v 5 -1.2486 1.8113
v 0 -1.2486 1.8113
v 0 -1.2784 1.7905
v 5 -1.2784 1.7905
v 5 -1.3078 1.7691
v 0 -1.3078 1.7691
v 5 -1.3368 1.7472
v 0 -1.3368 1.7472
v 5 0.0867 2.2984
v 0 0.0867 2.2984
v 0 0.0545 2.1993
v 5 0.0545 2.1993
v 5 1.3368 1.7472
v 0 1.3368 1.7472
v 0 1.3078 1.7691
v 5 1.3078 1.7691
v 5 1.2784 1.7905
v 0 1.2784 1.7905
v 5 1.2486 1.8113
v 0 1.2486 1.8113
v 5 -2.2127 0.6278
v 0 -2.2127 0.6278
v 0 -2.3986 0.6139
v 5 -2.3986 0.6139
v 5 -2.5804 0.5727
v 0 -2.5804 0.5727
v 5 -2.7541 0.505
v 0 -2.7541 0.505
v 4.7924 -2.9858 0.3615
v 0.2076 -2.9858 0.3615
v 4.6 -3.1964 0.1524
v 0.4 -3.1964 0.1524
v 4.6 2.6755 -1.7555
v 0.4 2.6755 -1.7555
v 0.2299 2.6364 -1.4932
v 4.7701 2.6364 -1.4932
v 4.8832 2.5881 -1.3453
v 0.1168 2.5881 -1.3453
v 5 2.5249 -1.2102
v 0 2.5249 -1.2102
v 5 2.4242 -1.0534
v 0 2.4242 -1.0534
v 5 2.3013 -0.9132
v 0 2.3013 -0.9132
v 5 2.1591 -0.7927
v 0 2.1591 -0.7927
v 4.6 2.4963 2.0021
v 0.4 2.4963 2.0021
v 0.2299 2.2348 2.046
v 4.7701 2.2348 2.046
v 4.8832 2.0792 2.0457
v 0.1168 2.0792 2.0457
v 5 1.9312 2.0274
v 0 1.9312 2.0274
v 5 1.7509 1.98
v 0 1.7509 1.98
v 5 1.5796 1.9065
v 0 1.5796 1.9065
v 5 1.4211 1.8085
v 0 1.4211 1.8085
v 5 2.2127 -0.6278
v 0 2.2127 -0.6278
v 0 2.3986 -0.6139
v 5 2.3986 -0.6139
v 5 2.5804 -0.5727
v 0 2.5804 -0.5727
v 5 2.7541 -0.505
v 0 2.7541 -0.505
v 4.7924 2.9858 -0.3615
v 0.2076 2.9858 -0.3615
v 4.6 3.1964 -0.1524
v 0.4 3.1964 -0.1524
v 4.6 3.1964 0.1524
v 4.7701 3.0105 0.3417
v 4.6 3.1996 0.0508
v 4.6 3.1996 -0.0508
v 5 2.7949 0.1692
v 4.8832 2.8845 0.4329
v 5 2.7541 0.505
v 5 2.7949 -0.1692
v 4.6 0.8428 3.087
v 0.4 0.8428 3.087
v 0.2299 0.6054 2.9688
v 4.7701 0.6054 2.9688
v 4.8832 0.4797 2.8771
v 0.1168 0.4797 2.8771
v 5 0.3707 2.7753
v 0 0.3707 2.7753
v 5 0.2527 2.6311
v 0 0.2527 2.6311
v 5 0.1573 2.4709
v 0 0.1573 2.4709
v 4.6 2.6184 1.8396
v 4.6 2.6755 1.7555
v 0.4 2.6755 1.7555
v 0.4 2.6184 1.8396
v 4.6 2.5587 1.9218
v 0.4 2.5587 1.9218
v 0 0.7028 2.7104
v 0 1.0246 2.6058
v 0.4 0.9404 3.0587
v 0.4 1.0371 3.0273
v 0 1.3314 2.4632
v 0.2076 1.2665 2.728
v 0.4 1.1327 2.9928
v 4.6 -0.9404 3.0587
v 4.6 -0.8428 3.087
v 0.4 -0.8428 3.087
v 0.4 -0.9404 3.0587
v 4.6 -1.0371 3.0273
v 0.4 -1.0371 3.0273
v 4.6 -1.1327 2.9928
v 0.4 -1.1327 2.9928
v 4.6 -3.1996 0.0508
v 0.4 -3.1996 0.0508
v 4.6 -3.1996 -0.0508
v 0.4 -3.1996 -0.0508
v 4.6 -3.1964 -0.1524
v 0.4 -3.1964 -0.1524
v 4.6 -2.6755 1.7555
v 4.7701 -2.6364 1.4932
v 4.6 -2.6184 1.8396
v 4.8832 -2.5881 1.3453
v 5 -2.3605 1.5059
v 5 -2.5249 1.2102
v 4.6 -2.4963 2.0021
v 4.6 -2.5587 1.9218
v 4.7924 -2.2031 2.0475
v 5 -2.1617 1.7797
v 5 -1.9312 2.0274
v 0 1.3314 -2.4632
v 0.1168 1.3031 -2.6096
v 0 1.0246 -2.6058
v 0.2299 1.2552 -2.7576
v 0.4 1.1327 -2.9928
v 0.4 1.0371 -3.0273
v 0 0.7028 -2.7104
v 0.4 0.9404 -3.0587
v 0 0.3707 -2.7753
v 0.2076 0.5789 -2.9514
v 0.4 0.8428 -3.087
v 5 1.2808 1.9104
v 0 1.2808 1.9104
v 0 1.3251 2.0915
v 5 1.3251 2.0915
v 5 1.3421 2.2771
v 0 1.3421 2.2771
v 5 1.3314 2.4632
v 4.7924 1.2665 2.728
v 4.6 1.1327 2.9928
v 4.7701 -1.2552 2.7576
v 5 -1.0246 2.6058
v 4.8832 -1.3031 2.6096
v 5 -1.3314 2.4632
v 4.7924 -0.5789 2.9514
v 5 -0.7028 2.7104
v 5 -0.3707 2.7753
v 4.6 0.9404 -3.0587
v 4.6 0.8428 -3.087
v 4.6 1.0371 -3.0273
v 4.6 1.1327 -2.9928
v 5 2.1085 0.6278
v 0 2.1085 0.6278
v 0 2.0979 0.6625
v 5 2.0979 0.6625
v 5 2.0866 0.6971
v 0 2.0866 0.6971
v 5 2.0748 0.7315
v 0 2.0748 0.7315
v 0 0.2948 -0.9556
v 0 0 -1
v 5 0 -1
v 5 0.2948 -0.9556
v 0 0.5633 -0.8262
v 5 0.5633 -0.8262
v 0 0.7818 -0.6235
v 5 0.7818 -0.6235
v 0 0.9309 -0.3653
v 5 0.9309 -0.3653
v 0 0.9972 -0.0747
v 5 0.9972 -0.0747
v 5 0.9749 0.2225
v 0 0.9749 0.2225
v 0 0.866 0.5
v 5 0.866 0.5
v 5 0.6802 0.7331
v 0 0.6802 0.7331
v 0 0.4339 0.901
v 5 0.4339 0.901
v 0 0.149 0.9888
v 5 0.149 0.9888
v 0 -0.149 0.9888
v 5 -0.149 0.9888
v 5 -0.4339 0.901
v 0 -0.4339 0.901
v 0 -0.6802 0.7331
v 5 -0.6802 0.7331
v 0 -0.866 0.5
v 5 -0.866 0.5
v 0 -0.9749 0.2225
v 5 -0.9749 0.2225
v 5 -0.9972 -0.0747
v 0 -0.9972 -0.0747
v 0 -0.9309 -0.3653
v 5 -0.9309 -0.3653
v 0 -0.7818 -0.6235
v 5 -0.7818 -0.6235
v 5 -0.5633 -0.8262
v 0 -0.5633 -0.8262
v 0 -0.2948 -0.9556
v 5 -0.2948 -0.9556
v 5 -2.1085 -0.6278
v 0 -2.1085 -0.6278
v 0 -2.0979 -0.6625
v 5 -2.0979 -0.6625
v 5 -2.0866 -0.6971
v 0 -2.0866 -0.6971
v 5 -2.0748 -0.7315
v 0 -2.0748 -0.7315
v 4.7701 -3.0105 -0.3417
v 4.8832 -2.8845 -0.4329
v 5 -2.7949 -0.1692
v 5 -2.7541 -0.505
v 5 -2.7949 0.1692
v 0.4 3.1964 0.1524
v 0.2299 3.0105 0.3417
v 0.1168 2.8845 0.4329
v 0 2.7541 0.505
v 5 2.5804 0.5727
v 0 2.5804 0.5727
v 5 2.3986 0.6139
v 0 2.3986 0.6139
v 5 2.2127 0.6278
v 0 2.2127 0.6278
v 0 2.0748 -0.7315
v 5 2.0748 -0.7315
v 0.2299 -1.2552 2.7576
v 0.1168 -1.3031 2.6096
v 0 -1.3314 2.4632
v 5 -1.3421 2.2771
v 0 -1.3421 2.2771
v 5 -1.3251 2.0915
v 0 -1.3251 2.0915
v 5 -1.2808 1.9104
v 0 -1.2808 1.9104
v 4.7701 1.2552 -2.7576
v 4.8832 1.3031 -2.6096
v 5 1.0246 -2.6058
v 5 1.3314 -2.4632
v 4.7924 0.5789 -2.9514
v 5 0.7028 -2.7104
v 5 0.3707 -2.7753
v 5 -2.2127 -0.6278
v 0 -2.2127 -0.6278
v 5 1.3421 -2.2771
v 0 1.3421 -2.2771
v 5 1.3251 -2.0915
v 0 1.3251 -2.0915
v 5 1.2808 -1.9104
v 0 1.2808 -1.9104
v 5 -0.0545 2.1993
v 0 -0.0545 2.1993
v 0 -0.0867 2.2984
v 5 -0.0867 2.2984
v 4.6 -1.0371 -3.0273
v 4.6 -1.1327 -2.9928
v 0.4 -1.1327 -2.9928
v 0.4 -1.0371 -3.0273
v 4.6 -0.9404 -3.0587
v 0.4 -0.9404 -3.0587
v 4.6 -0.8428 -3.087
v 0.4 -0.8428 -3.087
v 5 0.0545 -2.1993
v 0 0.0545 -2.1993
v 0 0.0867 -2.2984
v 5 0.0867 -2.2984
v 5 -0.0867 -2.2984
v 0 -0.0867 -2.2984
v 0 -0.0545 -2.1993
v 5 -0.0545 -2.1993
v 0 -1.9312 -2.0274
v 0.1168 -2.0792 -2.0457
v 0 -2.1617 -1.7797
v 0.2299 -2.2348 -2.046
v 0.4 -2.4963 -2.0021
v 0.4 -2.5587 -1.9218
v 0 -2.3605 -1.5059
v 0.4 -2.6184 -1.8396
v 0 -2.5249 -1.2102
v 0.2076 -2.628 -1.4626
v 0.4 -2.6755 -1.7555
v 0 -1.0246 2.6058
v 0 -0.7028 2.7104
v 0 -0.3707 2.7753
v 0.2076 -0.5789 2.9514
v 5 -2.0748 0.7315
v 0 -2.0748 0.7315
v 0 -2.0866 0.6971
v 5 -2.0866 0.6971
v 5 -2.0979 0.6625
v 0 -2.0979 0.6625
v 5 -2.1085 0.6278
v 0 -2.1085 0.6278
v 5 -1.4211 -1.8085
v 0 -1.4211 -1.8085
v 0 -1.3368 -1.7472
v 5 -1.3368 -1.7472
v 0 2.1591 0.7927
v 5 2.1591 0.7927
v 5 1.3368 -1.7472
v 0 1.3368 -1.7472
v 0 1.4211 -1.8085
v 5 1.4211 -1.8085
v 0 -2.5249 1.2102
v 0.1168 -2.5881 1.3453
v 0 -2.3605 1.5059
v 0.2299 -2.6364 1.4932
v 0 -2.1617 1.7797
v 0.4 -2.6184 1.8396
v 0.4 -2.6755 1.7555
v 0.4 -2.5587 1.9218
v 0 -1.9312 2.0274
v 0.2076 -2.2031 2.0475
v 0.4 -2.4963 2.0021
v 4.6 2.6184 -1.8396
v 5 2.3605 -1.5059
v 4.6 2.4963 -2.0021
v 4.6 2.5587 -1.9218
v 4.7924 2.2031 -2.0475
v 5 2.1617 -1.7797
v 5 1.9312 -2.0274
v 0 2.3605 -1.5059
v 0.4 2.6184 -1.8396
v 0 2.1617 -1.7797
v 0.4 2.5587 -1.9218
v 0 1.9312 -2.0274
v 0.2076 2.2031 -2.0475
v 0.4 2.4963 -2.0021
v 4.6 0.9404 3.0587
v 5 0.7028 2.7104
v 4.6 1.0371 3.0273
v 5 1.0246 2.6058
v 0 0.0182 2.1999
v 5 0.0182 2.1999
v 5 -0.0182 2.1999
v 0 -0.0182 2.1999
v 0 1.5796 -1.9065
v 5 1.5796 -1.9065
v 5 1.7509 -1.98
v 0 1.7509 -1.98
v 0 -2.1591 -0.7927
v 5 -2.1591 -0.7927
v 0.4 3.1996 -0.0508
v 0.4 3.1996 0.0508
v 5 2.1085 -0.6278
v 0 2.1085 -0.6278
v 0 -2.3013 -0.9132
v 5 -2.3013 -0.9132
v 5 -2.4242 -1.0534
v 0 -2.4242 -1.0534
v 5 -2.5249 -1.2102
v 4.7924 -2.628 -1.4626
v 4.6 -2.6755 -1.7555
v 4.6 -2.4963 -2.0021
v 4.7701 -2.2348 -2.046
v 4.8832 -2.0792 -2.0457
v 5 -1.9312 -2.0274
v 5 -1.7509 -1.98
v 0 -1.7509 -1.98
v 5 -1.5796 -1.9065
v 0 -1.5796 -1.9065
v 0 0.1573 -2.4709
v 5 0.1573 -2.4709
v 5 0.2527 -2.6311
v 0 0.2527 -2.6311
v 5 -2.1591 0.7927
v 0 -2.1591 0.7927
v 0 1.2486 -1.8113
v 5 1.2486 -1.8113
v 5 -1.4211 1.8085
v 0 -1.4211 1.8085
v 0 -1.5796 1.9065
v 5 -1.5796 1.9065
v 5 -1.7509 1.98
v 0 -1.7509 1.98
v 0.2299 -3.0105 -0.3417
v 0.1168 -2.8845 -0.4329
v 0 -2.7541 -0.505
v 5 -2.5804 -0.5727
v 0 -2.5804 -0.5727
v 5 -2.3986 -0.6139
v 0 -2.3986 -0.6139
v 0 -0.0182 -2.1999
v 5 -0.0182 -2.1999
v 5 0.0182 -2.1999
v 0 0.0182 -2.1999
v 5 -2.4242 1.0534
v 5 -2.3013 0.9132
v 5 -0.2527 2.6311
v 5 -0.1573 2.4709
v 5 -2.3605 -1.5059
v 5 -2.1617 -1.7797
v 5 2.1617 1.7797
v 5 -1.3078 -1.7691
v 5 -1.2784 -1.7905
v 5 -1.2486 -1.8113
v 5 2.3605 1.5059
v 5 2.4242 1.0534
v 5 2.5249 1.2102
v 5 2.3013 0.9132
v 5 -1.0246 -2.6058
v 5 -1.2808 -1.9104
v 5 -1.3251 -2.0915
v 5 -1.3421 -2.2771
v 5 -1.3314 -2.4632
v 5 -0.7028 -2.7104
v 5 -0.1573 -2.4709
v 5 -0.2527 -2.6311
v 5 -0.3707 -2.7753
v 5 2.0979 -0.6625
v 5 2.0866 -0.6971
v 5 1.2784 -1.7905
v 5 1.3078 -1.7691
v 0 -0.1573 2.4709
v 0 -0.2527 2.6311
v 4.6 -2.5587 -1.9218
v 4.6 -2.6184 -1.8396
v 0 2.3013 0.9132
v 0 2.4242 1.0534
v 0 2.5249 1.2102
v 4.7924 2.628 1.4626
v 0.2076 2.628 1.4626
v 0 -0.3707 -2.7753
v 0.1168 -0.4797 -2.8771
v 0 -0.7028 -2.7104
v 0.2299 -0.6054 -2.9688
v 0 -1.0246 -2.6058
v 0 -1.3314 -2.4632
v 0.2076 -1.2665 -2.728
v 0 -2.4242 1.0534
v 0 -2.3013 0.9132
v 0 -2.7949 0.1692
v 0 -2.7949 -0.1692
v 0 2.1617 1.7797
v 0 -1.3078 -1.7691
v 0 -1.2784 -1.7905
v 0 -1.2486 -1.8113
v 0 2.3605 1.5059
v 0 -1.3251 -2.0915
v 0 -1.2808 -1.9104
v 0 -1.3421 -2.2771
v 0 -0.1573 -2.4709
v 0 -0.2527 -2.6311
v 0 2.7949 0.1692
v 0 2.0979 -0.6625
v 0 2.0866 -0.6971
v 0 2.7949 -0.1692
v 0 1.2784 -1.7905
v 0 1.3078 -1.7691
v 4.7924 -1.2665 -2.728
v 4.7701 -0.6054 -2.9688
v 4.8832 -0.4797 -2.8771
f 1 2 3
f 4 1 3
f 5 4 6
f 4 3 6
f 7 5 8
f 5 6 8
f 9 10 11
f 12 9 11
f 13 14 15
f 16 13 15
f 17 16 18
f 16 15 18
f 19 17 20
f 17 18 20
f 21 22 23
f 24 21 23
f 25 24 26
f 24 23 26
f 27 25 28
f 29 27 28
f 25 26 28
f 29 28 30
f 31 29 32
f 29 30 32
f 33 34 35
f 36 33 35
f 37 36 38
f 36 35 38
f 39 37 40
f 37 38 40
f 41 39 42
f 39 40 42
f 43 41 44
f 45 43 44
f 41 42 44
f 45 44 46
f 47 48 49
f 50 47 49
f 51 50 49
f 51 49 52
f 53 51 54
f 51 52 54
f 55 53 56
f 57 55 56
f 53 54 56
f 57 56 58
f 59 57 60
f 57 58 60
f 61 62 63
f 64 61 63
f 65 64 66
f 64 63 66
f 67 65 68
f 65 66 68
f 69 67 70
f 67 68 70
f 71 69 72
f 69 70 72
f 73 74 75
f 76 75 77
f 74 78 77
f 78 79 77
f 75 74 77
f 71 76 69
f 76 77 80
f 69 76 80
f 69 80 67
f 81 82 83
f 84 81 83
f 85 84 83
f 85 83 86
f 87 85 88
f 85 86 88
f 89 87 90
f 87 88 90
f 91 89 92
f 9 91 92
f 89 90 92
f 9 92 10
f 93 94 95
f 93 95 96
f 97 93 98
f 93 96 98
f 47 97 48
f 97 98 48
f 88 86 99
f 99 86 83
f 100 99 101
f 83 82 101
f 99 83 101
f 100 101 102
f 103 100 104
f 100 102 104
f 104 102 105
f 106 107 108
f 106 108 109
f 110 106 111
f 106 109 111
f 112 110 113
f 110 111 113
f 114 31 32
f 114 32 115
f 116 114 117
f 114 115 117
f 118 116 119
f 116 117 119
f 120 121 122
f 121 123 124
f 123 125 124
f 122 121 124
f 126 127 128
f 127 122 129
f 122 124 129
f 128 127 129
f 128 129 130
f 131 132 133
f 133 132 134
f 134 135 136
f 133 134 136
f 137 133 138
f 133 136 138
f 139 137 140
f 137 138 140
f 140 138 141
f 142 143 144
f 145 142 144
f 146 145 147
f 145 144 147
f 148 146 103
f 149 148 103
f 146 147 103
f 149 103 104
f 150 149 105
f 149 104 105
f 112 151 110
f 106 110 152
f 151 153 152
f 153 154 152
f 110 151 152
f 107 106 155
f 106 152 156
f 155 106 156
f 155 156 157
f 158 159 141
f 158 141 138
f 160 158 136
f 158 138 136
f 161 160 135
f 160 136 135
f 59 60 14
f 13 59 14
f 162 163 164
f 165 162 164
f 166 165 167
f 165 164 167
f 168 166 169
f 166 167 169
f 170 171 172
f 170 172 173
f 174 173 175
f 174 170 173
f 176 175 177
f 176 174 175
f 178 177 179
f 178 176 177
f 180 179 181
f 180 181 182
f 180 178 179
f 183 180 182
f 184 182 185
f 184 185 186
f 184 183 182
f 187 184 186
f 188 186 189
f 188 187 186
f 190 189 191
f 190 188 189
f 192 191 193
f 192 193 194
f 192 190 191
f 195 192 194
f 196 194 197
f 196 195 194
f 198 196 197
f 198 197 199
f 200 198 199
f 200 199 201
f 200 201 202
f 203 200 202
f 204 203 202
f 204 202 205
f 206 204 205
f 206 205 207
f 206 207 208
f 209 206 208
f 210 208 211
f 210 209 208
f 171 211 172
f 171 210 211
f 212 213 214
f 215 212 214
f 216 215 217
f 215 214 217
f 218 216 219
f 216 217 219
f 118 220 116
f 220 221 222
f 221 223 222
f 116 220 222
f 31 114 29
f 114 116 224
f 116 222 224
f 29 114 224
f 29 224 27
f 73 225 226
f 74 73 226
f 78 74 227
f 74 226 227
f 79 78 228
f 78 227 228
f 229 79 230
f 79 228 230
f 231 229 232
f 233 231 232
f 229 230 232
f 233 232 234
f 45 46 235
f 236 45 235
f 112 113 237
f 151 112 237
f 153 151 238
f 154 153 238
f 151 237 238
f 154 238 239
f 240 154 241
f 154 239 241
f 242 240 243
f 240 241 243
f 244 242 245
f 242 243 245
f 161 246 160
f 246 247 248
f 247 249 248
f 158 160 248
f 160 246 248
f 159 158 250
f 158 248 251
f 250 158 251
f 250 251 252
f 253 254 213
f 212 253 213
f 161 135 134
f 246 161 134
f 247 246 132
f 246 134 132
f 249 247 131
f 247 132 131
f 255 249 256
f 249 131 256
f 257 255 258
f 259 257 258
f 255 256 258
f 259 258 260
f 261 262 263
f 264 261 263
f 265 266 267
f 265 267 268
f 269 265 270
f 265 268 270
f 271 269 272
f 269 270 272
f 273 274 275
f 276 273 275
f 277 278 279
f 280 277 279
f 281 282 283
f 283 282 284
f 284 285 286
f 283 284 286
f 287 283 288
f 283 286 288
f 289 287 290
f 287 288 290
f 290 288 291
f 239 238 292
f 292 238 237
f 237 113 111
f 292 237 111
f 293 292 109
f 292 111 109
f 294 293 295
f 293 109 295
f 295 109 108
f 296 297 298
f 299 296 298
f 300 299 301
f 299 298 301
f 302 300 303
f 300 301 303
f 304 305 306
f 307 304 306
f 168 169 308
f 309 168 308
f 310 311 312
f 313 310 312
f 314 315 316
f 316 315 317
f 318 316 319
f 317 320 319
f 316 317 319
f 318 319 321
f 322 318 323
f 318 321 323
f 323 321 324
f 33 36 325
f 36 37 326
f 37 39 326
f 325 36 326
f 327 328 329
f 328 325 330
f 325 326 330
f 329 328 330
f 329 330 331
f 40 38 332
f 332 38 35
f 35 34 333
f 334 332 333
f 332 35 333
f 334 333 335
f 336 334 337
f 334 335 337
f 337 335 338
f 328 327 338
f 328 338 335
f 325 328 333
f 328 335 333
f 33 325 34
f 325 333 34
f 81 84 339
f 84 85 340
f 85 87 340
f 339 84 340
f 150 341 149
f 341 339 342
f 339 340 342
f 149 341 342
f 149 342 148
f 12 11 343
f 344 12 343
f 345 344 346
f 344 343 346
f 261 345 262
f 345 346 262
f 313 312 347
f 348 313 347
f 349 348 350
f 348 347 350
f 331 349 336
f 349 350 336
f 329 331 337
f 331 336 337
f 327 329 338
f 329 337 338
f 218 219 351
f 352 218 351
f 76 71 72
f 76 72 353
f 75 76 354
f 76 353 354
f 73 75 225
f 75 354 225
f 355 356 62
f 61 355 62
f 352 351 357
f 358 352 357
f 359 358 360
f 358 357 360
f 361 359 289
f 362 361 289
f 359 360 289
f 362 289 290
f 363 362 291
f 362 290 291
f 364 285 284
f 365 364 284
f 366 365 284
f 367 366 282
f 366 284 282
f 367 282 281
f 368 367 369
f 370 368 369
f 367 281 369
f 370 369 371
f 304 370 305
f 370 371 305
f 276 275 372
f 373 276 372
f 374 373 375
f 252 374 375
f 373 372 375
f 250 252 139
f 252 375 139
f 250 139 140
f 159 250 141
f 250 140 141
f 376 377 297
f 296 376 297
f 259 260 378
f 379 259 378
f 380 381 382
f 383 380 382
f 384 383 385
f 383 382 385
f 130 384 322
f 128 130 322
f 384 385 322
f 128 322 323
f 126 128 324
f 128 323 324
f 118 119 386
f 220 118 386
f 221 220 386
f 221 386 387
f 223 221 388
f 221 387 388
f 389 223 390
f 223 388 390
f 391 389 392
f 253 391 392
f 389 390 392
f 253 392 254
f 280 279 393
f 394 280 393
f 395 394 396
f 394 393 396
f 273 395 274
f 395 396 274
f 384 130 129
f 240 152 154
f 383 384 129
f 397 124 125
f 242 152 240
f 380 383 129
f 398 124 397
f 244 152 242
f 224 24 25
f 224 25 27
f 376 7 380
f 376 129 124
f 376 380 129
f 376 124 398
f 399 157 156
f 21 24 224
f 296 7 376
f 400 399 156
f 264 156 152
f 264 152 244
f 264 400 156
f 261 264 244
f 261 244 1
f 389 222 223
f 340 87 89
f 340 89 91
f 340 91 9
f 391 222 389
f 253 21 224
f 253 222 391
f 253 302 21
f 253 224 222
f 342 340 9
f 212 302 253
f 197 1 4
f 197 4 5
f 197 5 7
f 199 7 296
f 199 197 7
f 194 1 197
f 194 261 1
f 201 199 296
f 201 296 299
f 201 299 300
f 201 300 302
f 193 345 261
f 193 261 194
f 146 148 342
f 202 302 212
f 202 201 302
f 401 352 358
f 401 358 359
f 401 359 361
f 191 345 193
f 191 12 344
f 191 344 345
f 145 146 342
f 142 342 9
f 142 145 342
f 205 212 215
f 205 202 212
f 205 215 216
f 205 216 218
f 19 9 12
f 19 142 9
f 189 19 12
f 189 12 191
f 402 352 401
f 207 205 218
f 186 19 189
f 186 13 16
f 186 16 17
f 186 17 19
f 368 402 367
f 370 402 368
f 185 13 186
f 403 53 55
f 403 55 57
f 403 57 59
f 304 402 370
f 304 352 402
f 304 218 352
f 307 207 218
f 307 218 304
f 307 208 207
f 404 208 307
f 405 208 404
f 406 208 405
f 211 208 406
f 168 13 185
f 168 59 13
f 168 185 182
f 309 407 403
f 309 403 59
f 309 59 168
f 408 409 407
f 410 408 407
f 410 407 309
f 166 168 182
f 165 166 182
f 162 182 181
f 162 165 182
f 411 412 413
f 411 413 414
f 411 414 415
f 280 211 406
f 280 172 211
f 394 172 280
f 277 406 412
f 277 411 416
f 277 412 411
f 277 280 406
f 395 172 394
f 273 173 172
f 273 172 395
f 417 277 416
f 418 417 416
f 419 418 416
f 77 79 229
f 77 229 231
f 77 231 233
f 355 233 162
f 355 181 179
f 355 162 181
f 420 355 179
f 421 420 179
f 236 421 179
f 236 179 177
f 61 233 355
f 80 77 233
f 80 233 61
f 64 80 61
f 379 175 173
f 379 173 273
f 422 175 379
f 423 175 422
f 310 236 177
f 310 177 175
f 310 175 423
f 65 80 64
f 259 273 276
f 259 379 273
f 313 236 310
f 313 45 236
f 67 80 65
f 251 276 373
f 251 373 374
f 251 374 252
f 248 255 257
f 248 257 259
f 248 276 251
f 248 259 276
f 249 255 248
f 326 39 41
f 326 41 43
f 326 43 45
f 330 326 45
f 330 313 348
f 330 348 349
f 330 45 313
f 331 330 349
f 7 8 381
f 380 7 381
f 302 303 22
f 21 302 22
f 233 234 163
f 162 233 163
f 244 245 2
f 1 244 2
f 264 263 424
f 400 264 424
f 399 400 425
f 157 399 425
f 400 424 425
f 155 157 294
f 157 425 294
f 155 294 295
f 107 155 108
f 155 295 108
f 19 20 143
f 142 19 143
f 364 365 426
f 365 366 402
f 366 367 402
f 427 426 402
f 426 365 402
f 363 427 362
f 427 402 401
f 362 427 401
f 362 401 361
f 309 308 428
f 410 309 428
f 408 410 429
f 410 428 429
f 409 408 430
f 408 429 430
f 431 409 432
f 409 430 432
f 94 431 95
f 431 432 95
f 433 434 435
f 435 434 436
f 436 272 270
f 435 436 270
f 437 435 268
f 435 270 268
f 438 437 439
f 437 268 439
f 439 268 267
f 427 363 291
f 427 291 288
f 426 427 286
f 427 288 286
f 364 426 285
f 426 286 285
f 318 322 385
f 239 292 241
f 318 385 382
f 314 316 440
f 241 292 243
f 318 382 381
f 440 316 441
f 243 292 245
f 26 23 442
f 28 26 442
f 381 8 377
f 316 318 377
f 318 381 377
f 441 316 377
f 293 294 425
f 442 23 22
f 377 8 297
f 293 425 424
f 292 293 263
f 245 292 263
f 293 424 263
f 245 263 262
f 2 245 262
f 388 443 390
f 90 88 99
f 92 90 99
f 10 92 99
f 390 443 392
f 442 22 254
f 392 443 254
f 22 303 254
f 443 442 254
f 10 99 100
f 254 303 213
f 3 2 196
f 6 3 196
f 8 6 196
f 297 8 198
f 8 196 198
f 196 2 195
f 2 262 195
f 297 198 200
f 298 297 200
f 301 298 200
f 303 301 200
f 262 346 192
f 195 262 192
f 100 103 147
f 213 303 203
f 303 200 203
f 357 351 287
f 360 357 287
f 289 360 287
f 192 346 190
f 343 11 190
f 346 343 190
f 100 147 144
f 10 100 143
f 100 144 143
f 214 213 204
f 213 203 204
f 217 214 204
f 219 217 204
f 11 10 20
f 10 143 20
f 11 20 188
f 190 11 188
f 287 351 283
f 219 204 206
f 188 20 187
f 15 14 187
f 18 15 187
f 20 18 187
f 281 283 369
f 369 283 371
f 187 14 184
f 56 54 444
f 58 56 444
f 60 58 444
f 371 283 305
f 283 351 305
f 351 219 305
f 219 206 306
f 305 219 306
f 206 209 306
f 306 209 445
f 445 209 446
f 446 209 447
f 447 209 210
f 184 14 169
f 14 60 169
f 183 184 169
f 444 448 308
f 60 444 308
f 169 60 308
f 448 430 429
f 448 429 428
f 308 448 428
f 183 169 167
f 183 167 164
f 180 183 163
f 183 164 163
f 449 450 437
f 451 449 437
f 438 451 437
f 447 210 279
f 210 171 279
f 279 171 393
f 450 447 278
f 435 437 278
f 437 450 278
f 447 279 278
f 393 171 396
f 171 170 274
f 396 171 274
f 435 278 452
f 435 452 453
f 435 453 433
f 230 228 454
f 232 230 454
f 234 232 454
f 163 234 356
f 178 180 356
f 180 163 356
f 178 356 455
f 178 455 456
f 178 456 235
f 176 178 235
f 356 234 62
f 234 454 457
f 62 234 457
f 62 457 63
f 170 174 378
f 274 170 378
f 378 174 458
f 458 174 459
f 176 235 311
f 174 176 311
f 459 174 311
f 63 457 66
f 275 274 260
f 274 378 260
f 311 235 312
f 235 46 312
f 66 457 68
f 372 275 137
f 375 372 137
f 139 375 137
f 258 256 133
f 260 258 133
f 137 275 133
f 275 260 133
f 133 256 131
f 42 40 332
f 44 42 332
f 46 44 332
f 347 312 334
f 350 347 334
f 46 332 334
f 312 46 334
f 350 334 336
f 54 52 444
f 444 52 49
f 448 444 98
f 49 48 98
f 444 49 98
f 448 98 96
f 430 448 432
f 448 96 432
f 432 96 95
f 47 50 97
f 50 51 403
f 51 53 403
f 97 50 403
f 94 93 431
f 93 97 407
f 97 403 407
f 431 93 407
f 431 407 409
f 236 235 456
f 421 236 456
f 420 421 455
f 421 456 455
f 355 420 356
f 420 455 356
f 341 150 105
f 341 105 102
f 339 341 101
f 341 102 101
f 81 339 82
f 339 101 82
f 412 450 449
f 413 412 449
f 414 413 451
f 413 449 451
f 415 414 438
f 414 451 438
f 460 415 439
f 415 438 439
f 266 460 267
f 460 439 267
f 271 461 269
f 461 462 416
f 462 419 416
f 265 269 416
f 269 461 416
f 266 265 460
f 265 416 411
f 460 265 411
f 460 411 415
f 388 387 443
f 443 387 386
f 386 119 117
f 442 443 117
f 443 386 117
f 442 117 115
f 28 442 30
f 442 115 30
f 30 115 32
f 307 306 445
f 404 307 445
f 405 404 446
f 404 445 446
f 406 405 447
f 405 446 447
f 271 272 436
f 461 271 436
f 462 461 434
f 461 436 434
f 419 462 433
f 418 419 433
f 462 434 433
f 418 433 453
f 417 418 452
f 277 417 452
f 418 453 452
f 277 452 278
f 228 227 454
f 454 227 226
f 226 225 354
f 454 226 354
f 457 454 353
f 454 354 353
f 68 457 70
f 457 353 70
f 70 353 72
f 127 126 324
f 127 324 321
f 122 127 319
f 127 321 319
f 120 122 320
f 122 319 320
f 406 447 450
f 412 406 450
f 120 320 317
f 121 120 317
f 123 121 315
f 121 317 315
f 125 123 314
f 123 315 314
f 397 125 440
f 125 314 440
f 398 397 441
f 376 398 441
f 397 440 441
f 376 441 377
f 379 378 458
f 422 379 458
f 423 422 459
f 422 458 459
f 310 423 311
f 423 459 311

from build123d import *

# Parameters (mm, degrees)
SKETCH2_R           = 2.2
SKETCH2_R_2         = 1
BOSS_EXTRUDE2_DEPTH = 5
BOSS_EXTRUDE3_DEPTH = 5
CIRPATTERN1_COUNT   = 10


with BuildPart() as part:
    # Sketch2 → Boss-Extrude2 (new body)
    with BuildSketch(Plane(origin=(0, 0, 0), x_dir=(0, 0, -1), z_dir=(1, 0, 0))):
        Circle(SKETCH2_R)
        Circle(SKETCH2_R_2, mode=Mode.SUBTRACT)
    extrude(amount=BOSS_EXTRUDE2_DEPTH)


with BuildPart() as body_2:
    # Sketch3 → Boss-Extrude3 (new body)
    with BuildSketch(Plane(origin=(0, 0, 0), x_dir=(0, 0, -1), z_dir=(1, 0, 0))):
        with BuildLine():
            ThreePointArc((-0.627770898, 2.108531171), (0, 2.2), (0.627770898, 2.108531171))
            Line((0.627770898, 2.108531171), (0.627770898, 2.212668909))
            ThreePointArc((0.627770898, 2.212668909), (0.502708566, 2.758930187), (0.15243605, 3.196367196))
            ThreePointArc((0.15243605, 3.196367196), (0, 3.2), (-0.15243605, 3.196367196))
            ThreePointArc((-0.15243605, 3.196367196), (-0.502708566, 2.758930187), (-0.627770898, 2.212668909))
            Line((-0.627770898, 2.212668909), (-0.627770898, 2.108531171))
        make_face()
    extrude(amount=BOSS_EXTRUDE3_DEPTH)


with BuildPart() as cirpattern1_1:
    # CirPattern1: pattern copy
    add(body_2.part.rotate(Axis((0, 0, 0), (1, 0, 0)), 1 * 360 / CIRPATTERN1_COUNT))


with BuildPart() as cirpattern1_2:
    # CirPattern1: pattern copy
    add(body_2.part.rotate(Axis((0, 0, 0), (1, 0, 0)), 2 * 360 / CIRPATTERN1_COUNT))


with BuildPart() as cirpattern1_3:
    # CirPattern1: pattern copy
    add(body_2.part.rotate(Axis((0, 0, 0), (1, 0, 0)), 3 * 360 / CIRPATTERN1_COUNT))


with BuildPart() as cirpattern1_4:
    # CirPattern1: pattern copy
    add(body_2.part.rotate(Axis((0, 0, 0), (1, 0, 0)), 4 * 360 / CIRPATTERN1_COUNT))


with BuildPart() as cirpattern1_5:
    # CirPattern1: pattern copy
    add(body_2.part.rotate(Axis((0, 0, 0), (1, 0, 0)), 5 * 360 / CIRPATTERN1_COUNT))


with BuildPart() as cirpattern1_6:
    # CirPattern1: pattern copy
    add(body_2.part.rotate(Axis((0, 0, 0), (1, 0, 0)), 6 * 360 / CIRPATTERN1_COUNT))


with BuildPart() as cirpattern1_7:
    # CirPattern1: pattern copy
    add(body_2.part.rotate(Axis((0, 0, 0), (1, 0, 0)), 7 * 360 / CIRPATTERN1_COUNT))


with BuildPart() as cirpattern1_8:
    # CirPattern1: pattern copy
    add(body_2.part.rotate(Axis((0, 0, 0), (1, 0, 0)), 8 * 360 / CIRPATTERN1_COUNT))


with BuildPart() as cirpattern1_9:
    # CirPattern1: pattern copy
    add(body_2.part.rotate(Axis((0, 0, 0), (1, 0, 0)), 9 * 360 / CIRPATTERN1_COUNT))


with BuildPart() as body_2_1:
    add(body_2.part)

    # Combine1: union CirPattern1_7, CirPattern1_6, CirPattern1_4, CirPattern1_3, part, CirPattern1_1, CirPattern1_2, CirPattern1_5, CirPattern1_8, CirPattern1_9
    add(cirpattern1_7.part)
    add(cirpattern1_6.part)
    add(cirpattern1_4.part)
    add(cirpattern1_3.part)
    add(part.part)
    add(cirpattern1_1.part)
    add(cirpattern1_2.part)
    add(cirpattern1_5.part)
    add(cirpattern1_8.part)
    add(cirpattern1_9.part)

    # Sketch4 → Cut-Revolve1 (revolve, cut)
    with BuildSketch(Plane.XY):
        Polygon((0, 0), (0, 2.8), (0.4, 3.2), (4.6, 3.2), (5, 2.8), (5, 0), (6, 0), (6, 4.2), (-1, 4.2), (-1, 0), align=None)
    revolve(axis=Axis((6, 0, 0), (-1, 0, 0)), mode=Mode.SUBTRACT)


solid = body_2_1.part
